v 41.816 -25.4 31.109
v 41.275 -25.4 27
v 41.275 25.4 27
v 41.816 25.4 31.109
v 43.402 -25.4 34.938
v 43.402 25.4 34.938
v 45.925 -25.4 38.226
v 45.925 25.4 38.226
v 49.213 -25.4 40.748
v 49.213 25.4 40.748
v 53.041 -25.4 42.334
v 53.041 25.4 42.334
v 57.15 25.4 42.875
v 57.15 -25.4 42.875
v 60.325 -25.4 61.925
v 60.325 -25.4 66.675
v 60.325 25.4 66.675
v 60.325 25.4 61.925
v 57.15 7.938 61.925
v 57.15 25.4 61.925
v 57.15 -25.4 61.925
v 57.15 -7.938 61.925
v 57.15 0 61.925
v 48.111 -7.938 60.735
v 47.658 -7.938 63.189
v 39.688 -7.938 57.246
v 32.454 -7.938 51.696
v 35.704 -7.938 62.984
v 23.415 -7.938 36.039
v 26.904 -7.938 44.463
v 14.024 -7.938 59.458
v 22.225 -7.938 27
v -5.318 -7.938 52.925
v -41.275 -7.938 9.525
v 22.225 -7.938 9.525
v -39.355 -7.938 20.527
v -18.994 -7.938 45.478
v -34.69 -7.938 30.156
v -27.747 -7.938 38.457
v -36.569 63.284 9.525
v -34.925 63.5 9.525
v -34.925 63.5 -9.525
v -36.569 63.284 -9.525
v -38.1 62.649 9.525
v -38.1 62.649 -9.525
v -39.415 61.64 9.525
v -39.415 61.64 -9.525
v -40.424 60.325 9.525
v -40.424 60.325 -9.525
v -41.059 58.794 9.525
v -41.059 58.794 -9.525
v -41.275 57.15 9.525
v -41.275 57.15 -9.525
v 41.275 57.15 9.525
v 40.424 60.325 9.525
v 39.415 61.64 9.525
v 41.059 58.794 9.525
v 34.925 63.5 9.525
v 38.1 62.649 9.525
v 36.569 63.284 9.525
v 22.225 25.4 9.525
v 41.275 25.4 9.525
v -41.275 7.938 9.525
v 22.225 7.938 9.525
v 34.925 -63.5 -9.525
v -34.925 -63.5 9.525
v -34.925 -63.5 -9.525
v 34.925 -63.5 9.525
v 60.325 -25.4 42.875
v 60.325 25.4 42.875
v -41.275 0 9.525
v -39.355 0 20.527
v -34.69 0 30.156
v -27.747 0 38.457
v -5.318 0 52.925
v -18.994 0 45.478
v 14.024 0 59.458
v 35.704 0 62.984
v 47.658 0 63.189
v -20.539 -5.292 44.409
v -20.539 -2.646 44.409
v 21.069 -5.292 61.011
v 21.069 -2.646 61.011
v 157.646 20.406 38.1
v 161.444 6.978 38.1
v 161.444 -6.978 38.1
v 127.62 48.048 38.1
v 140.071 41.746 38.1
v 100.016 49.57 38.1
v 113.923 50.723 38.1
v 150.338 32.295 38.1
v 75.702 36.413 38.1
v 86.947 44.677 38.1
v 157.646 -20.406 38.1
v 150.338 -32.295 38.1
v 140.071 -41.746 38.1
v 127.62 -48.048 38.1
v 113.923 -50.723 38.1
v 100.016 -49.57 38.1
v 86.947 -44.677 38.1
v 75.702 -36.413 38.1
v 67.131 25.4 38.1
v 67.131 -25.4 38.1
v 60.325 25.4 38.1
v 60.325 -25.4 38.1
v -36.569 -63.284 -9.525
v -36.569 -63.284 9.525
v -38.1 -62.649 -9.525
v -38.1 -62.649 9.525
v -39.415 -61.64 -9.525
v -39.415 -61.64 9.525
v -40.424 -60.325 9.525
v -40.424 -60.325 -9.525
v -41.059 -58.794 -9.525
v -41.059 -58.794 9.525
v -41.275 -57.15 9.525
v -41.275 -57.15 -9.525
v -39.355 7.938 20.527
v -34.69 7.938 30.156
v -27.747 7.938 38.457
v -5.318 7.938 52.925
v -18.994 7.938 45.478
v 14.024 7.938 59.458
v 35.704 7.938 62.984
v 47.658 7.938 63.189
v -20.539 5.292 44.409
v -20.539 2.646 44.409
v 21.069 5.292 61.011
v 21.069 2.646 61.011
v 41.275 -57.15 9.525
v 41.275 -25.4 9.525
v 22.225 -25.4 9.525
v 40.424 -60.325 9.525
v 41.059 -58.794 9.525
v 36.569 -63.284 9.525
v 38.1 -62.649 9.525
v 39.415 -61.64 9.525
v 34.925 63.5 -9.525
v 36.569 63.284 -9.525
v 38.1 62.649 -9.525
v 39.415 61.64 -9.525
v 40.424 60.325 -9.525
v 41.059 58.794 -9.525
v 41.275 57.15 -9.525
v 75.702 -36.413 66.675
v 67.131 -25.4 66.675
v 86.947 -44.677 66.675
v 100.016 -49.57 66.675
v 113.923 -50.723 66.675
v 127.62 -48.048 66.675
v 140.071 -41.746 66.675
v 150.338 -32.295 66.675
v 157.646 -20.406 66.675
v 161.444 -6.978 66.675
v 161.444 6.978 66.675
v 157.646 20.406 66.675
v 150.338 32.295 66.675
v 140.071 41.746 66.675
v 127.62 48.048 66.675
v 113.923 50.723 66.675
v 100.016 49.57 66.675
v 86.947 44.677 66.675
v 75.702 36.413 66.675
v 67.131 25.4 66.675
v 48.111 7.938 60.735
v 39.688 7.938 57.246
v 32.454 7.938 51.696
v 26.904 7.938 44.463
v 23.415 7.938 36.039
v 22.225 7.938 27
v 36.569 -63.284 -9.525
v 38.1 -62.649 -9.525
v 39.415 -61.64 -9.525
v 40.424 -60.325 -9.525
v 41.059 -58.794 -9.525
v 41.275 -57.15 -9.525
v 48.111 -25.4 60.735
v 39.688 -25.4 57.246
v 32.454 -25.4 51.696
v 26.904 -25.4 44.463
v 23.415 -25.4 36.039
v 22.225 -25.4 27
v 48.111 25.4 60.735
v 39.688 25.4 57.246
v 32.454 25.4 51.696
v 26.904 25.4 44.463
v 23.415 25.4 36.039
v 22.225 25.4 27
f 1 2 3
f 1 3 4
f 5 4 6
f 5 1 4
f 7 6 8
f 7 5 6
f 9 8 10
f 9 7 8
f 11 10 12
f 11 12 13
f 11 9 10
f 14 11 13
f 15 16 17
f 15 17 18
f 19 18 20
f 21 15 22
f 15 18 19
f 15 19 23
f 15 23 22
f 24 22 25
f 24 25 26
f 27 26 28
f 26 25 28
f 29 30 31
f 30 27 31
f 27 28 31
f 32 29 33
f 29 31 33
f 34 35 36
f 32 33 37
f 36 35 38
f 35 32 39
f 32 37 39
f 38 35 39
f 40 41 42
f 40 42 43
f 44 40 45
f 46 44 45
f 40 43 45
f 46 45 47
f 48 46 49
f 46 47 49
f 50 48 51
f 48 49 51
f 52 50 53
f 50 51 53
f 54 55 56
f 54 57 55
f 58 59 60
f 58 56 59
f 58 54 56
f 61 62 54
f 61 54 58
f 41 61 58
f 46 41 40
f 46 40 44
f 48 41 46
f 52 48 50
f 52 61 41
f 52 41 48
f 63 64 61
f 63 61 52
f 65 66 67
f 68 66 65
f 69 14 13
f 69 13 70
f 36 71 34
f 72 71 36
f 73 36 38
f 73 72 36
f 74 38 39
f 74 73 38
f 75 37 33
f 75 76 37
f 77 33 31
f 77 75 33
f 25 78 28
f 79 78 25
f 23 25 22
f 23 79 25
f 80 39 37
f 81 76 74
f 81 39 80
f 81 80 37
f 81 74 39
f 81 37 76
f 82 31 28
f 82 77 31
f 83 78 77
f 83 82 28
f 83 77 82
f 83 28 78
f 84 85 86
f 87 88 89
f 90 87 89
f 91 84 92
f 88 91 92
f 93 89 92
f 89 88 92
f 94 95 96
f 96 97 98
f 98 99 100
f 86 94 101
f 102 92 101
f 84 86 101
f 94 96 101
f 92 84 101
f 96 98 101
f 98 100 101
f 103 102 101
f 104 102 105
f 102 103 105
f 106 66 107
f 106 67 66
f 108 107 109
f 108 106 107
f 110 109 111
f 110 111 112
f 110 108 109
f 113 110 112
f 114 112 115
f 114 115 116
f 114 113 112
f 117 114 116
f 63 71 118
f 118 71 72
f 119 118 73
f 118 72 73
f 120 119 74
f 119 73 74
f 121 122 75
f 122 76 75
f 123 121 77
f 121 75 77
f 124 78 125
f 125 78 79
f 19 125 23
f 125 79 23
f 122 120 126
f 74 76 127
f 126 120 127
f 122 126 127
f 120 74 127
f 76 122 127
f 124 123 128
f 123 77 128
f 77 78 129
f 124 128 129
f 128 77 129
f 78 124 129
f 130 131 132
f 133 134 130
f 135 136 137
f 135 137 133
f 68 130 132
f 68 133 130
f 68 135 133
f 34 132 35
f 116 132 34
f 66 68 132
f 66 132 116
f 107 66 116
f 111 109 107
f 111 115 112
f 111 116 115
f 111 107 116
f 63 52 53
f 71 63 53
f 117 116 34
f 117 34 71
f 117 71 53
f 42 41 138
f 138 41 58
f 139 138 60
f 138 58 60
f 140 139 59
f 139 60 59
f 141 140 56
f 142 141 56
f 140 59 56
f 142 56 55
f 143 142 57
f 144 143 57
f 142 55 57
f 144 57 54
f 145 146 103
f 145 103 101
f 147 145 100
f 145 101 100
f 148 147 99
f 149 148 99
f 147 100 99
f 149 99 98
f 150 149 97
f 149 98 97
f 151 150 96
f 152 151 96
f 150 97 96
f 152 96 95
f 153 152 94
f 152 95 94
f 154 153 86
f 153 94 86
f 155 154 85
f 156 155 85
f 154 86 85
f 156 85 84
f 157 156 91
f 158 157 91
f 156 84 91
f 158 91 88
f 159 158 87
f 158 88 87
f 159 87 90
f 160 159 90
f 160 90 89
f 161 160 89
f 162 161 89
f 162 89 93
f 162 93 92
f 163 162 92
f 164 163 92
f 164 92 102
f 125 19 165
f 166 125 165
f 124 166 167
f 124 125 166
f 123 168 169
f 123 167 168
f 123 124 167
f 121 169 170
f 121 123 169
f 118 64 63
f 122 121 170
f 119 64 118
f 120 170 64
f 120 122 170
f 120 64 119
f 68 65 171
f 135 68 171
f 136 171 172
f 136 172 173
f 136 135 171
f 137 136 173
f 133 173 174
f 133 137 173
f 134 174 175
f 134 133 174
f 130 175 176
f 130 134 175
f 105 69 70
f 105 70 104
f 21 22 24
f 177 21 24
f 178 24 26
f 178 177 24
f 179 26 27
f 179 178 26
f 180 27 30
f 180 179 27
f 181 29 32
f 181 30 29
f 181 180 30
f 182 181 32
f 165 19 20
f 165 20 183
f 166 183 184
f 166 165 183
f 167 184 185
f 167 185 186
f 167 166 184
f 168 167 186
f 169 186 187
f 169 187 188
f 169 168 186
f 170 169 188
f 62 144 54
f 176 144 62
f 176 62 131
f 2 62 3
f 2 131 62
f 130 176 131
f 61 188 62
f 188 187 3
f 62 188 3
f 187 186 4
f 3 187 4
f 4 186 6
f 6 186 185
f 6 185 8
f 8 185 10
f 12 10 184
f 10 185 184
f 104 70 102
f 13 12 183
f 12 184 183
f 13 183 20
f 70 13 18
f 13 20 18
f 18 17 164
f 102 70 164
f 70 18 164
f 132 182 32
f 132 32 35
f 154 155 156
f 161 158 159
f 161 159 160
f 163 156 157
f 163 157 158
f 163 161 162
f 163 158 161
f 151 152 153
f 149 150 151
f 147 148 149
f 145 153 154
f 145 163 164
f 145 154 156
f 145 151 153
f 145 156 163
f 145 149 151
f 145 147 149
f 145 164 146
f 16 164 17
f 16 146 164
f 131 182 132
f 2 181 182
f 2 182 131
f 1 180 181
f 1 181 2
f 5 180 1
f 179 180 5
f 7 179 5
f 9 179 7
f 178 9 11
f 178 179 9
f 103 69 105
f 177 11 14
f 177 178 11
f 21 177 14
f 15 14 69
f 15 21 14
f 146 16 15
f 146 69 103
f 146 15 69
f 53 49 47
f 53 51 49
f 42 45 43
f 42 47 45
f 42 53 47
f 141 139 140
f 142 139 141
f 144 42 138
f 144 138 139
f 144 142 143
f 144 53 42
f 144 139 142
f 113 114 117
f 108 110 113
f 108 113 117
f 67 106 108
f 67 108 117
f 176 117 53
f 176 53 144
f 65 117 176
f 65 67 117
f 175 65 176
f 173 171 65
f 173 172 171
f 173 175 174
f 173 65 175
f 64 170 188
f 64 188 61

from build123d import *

# Parameters (mm, degrees)
F1_DEPTH = 63.5
F2_DEPTH = 25.4
F3_DEPTH = 7.9375
F5_R     = 6.35


with BuildPart() as f1:
    # F0 (on Front) → F1 (new body, symmetric)
    with BuildSketch(Plane.XZ):
        Polygon((22.225, 9.525), (-41.275, 9.525), (-41.275, -9.525), (41.275, -9.525), (41.275, 9.525), align=None)
    extrude(amount=F1_DEPTH, both=True)

    # F0 (on Front) → F2 (join, symmetric)
    with BuildSketch(Plane.XZ):
        with BuildLine():
            Line((22.225, 27.0002), (22.225, 9.525))
            Line((22.225, 9.525), (41.275, 9.525))
            Line((41.275, 9.525), (41.275, 27.0002))
            ThreePointArc((41.275, 27.0002), (45.92468, 38.22552), (57.15, 42.8752))
            Line((57.15, 42.8752), (60.325, 42.8752))
            Line((60.325, 42.8752), (60.325, 61.9252))
            Line((60.325, 61.9252), (57.15, 61.9252))
            ThreePointArc((57.15, 61.9252), (32.454296, 51.695904), (22.225, 27.0002))
        make_face()
        Polygon((60.325, 66.675), (60.325, 61.9252), (60.325, 42.8752), (60.325, 38.1), (111.125, 38.1), (111.125, 66.675), align=None)
    extrude(amount=F2_DEPTH, both=True)

    # F0 (on Front) → F3 (join, symmetric)
    with BuildSketch(Plane.XZ):
        with BuildLine():
            add(Edge.make_bspline(
                [(-41.275, 9.525), (-39.773323, 54.415304), (32.63097, 67.989412), (57.15, 61.9252)],
                knots=[0, 0, 0, 0, 111.504536, 111.504536, 111.504536, 111.504536], degree=3))
            Line((-41.275, 9.525), (22.225, 9.525))
            Line((22.225, 9.525), (22.225, 27.0002))
            ThreePointArc((22.225, 27.0002), (32.454296, 51.695904), (57.15, 61.9252))
        make_face()
    extrude(amount=F3_DEPTH, both=True)

    # F0 (on Front) → F4 (revolve)
    with BuildSketch(Plane.XZ):
        Polygon((60.325, 66.675), (60.325, 61.9252), (60.325, 42.8752), (60.325, 38.1), (111.125, 38.1), (111.125, 66.675), align=None)
    revolve(axis=Axis((111.125, 0, 52.3875), (0, 0, 1)))

    # F5
    f5_edges = [f1.edges().sort_by_distance(p)[0] for p in [
        (-41.275, -63.5, 0),
        (41.275, -63.5, 0),
        (41.275, 63.5, 0),
        (-41.275, 63.5, 0),
    ]]
    fillet(f5_edges, radius=F5_R)


solid = f1.part
